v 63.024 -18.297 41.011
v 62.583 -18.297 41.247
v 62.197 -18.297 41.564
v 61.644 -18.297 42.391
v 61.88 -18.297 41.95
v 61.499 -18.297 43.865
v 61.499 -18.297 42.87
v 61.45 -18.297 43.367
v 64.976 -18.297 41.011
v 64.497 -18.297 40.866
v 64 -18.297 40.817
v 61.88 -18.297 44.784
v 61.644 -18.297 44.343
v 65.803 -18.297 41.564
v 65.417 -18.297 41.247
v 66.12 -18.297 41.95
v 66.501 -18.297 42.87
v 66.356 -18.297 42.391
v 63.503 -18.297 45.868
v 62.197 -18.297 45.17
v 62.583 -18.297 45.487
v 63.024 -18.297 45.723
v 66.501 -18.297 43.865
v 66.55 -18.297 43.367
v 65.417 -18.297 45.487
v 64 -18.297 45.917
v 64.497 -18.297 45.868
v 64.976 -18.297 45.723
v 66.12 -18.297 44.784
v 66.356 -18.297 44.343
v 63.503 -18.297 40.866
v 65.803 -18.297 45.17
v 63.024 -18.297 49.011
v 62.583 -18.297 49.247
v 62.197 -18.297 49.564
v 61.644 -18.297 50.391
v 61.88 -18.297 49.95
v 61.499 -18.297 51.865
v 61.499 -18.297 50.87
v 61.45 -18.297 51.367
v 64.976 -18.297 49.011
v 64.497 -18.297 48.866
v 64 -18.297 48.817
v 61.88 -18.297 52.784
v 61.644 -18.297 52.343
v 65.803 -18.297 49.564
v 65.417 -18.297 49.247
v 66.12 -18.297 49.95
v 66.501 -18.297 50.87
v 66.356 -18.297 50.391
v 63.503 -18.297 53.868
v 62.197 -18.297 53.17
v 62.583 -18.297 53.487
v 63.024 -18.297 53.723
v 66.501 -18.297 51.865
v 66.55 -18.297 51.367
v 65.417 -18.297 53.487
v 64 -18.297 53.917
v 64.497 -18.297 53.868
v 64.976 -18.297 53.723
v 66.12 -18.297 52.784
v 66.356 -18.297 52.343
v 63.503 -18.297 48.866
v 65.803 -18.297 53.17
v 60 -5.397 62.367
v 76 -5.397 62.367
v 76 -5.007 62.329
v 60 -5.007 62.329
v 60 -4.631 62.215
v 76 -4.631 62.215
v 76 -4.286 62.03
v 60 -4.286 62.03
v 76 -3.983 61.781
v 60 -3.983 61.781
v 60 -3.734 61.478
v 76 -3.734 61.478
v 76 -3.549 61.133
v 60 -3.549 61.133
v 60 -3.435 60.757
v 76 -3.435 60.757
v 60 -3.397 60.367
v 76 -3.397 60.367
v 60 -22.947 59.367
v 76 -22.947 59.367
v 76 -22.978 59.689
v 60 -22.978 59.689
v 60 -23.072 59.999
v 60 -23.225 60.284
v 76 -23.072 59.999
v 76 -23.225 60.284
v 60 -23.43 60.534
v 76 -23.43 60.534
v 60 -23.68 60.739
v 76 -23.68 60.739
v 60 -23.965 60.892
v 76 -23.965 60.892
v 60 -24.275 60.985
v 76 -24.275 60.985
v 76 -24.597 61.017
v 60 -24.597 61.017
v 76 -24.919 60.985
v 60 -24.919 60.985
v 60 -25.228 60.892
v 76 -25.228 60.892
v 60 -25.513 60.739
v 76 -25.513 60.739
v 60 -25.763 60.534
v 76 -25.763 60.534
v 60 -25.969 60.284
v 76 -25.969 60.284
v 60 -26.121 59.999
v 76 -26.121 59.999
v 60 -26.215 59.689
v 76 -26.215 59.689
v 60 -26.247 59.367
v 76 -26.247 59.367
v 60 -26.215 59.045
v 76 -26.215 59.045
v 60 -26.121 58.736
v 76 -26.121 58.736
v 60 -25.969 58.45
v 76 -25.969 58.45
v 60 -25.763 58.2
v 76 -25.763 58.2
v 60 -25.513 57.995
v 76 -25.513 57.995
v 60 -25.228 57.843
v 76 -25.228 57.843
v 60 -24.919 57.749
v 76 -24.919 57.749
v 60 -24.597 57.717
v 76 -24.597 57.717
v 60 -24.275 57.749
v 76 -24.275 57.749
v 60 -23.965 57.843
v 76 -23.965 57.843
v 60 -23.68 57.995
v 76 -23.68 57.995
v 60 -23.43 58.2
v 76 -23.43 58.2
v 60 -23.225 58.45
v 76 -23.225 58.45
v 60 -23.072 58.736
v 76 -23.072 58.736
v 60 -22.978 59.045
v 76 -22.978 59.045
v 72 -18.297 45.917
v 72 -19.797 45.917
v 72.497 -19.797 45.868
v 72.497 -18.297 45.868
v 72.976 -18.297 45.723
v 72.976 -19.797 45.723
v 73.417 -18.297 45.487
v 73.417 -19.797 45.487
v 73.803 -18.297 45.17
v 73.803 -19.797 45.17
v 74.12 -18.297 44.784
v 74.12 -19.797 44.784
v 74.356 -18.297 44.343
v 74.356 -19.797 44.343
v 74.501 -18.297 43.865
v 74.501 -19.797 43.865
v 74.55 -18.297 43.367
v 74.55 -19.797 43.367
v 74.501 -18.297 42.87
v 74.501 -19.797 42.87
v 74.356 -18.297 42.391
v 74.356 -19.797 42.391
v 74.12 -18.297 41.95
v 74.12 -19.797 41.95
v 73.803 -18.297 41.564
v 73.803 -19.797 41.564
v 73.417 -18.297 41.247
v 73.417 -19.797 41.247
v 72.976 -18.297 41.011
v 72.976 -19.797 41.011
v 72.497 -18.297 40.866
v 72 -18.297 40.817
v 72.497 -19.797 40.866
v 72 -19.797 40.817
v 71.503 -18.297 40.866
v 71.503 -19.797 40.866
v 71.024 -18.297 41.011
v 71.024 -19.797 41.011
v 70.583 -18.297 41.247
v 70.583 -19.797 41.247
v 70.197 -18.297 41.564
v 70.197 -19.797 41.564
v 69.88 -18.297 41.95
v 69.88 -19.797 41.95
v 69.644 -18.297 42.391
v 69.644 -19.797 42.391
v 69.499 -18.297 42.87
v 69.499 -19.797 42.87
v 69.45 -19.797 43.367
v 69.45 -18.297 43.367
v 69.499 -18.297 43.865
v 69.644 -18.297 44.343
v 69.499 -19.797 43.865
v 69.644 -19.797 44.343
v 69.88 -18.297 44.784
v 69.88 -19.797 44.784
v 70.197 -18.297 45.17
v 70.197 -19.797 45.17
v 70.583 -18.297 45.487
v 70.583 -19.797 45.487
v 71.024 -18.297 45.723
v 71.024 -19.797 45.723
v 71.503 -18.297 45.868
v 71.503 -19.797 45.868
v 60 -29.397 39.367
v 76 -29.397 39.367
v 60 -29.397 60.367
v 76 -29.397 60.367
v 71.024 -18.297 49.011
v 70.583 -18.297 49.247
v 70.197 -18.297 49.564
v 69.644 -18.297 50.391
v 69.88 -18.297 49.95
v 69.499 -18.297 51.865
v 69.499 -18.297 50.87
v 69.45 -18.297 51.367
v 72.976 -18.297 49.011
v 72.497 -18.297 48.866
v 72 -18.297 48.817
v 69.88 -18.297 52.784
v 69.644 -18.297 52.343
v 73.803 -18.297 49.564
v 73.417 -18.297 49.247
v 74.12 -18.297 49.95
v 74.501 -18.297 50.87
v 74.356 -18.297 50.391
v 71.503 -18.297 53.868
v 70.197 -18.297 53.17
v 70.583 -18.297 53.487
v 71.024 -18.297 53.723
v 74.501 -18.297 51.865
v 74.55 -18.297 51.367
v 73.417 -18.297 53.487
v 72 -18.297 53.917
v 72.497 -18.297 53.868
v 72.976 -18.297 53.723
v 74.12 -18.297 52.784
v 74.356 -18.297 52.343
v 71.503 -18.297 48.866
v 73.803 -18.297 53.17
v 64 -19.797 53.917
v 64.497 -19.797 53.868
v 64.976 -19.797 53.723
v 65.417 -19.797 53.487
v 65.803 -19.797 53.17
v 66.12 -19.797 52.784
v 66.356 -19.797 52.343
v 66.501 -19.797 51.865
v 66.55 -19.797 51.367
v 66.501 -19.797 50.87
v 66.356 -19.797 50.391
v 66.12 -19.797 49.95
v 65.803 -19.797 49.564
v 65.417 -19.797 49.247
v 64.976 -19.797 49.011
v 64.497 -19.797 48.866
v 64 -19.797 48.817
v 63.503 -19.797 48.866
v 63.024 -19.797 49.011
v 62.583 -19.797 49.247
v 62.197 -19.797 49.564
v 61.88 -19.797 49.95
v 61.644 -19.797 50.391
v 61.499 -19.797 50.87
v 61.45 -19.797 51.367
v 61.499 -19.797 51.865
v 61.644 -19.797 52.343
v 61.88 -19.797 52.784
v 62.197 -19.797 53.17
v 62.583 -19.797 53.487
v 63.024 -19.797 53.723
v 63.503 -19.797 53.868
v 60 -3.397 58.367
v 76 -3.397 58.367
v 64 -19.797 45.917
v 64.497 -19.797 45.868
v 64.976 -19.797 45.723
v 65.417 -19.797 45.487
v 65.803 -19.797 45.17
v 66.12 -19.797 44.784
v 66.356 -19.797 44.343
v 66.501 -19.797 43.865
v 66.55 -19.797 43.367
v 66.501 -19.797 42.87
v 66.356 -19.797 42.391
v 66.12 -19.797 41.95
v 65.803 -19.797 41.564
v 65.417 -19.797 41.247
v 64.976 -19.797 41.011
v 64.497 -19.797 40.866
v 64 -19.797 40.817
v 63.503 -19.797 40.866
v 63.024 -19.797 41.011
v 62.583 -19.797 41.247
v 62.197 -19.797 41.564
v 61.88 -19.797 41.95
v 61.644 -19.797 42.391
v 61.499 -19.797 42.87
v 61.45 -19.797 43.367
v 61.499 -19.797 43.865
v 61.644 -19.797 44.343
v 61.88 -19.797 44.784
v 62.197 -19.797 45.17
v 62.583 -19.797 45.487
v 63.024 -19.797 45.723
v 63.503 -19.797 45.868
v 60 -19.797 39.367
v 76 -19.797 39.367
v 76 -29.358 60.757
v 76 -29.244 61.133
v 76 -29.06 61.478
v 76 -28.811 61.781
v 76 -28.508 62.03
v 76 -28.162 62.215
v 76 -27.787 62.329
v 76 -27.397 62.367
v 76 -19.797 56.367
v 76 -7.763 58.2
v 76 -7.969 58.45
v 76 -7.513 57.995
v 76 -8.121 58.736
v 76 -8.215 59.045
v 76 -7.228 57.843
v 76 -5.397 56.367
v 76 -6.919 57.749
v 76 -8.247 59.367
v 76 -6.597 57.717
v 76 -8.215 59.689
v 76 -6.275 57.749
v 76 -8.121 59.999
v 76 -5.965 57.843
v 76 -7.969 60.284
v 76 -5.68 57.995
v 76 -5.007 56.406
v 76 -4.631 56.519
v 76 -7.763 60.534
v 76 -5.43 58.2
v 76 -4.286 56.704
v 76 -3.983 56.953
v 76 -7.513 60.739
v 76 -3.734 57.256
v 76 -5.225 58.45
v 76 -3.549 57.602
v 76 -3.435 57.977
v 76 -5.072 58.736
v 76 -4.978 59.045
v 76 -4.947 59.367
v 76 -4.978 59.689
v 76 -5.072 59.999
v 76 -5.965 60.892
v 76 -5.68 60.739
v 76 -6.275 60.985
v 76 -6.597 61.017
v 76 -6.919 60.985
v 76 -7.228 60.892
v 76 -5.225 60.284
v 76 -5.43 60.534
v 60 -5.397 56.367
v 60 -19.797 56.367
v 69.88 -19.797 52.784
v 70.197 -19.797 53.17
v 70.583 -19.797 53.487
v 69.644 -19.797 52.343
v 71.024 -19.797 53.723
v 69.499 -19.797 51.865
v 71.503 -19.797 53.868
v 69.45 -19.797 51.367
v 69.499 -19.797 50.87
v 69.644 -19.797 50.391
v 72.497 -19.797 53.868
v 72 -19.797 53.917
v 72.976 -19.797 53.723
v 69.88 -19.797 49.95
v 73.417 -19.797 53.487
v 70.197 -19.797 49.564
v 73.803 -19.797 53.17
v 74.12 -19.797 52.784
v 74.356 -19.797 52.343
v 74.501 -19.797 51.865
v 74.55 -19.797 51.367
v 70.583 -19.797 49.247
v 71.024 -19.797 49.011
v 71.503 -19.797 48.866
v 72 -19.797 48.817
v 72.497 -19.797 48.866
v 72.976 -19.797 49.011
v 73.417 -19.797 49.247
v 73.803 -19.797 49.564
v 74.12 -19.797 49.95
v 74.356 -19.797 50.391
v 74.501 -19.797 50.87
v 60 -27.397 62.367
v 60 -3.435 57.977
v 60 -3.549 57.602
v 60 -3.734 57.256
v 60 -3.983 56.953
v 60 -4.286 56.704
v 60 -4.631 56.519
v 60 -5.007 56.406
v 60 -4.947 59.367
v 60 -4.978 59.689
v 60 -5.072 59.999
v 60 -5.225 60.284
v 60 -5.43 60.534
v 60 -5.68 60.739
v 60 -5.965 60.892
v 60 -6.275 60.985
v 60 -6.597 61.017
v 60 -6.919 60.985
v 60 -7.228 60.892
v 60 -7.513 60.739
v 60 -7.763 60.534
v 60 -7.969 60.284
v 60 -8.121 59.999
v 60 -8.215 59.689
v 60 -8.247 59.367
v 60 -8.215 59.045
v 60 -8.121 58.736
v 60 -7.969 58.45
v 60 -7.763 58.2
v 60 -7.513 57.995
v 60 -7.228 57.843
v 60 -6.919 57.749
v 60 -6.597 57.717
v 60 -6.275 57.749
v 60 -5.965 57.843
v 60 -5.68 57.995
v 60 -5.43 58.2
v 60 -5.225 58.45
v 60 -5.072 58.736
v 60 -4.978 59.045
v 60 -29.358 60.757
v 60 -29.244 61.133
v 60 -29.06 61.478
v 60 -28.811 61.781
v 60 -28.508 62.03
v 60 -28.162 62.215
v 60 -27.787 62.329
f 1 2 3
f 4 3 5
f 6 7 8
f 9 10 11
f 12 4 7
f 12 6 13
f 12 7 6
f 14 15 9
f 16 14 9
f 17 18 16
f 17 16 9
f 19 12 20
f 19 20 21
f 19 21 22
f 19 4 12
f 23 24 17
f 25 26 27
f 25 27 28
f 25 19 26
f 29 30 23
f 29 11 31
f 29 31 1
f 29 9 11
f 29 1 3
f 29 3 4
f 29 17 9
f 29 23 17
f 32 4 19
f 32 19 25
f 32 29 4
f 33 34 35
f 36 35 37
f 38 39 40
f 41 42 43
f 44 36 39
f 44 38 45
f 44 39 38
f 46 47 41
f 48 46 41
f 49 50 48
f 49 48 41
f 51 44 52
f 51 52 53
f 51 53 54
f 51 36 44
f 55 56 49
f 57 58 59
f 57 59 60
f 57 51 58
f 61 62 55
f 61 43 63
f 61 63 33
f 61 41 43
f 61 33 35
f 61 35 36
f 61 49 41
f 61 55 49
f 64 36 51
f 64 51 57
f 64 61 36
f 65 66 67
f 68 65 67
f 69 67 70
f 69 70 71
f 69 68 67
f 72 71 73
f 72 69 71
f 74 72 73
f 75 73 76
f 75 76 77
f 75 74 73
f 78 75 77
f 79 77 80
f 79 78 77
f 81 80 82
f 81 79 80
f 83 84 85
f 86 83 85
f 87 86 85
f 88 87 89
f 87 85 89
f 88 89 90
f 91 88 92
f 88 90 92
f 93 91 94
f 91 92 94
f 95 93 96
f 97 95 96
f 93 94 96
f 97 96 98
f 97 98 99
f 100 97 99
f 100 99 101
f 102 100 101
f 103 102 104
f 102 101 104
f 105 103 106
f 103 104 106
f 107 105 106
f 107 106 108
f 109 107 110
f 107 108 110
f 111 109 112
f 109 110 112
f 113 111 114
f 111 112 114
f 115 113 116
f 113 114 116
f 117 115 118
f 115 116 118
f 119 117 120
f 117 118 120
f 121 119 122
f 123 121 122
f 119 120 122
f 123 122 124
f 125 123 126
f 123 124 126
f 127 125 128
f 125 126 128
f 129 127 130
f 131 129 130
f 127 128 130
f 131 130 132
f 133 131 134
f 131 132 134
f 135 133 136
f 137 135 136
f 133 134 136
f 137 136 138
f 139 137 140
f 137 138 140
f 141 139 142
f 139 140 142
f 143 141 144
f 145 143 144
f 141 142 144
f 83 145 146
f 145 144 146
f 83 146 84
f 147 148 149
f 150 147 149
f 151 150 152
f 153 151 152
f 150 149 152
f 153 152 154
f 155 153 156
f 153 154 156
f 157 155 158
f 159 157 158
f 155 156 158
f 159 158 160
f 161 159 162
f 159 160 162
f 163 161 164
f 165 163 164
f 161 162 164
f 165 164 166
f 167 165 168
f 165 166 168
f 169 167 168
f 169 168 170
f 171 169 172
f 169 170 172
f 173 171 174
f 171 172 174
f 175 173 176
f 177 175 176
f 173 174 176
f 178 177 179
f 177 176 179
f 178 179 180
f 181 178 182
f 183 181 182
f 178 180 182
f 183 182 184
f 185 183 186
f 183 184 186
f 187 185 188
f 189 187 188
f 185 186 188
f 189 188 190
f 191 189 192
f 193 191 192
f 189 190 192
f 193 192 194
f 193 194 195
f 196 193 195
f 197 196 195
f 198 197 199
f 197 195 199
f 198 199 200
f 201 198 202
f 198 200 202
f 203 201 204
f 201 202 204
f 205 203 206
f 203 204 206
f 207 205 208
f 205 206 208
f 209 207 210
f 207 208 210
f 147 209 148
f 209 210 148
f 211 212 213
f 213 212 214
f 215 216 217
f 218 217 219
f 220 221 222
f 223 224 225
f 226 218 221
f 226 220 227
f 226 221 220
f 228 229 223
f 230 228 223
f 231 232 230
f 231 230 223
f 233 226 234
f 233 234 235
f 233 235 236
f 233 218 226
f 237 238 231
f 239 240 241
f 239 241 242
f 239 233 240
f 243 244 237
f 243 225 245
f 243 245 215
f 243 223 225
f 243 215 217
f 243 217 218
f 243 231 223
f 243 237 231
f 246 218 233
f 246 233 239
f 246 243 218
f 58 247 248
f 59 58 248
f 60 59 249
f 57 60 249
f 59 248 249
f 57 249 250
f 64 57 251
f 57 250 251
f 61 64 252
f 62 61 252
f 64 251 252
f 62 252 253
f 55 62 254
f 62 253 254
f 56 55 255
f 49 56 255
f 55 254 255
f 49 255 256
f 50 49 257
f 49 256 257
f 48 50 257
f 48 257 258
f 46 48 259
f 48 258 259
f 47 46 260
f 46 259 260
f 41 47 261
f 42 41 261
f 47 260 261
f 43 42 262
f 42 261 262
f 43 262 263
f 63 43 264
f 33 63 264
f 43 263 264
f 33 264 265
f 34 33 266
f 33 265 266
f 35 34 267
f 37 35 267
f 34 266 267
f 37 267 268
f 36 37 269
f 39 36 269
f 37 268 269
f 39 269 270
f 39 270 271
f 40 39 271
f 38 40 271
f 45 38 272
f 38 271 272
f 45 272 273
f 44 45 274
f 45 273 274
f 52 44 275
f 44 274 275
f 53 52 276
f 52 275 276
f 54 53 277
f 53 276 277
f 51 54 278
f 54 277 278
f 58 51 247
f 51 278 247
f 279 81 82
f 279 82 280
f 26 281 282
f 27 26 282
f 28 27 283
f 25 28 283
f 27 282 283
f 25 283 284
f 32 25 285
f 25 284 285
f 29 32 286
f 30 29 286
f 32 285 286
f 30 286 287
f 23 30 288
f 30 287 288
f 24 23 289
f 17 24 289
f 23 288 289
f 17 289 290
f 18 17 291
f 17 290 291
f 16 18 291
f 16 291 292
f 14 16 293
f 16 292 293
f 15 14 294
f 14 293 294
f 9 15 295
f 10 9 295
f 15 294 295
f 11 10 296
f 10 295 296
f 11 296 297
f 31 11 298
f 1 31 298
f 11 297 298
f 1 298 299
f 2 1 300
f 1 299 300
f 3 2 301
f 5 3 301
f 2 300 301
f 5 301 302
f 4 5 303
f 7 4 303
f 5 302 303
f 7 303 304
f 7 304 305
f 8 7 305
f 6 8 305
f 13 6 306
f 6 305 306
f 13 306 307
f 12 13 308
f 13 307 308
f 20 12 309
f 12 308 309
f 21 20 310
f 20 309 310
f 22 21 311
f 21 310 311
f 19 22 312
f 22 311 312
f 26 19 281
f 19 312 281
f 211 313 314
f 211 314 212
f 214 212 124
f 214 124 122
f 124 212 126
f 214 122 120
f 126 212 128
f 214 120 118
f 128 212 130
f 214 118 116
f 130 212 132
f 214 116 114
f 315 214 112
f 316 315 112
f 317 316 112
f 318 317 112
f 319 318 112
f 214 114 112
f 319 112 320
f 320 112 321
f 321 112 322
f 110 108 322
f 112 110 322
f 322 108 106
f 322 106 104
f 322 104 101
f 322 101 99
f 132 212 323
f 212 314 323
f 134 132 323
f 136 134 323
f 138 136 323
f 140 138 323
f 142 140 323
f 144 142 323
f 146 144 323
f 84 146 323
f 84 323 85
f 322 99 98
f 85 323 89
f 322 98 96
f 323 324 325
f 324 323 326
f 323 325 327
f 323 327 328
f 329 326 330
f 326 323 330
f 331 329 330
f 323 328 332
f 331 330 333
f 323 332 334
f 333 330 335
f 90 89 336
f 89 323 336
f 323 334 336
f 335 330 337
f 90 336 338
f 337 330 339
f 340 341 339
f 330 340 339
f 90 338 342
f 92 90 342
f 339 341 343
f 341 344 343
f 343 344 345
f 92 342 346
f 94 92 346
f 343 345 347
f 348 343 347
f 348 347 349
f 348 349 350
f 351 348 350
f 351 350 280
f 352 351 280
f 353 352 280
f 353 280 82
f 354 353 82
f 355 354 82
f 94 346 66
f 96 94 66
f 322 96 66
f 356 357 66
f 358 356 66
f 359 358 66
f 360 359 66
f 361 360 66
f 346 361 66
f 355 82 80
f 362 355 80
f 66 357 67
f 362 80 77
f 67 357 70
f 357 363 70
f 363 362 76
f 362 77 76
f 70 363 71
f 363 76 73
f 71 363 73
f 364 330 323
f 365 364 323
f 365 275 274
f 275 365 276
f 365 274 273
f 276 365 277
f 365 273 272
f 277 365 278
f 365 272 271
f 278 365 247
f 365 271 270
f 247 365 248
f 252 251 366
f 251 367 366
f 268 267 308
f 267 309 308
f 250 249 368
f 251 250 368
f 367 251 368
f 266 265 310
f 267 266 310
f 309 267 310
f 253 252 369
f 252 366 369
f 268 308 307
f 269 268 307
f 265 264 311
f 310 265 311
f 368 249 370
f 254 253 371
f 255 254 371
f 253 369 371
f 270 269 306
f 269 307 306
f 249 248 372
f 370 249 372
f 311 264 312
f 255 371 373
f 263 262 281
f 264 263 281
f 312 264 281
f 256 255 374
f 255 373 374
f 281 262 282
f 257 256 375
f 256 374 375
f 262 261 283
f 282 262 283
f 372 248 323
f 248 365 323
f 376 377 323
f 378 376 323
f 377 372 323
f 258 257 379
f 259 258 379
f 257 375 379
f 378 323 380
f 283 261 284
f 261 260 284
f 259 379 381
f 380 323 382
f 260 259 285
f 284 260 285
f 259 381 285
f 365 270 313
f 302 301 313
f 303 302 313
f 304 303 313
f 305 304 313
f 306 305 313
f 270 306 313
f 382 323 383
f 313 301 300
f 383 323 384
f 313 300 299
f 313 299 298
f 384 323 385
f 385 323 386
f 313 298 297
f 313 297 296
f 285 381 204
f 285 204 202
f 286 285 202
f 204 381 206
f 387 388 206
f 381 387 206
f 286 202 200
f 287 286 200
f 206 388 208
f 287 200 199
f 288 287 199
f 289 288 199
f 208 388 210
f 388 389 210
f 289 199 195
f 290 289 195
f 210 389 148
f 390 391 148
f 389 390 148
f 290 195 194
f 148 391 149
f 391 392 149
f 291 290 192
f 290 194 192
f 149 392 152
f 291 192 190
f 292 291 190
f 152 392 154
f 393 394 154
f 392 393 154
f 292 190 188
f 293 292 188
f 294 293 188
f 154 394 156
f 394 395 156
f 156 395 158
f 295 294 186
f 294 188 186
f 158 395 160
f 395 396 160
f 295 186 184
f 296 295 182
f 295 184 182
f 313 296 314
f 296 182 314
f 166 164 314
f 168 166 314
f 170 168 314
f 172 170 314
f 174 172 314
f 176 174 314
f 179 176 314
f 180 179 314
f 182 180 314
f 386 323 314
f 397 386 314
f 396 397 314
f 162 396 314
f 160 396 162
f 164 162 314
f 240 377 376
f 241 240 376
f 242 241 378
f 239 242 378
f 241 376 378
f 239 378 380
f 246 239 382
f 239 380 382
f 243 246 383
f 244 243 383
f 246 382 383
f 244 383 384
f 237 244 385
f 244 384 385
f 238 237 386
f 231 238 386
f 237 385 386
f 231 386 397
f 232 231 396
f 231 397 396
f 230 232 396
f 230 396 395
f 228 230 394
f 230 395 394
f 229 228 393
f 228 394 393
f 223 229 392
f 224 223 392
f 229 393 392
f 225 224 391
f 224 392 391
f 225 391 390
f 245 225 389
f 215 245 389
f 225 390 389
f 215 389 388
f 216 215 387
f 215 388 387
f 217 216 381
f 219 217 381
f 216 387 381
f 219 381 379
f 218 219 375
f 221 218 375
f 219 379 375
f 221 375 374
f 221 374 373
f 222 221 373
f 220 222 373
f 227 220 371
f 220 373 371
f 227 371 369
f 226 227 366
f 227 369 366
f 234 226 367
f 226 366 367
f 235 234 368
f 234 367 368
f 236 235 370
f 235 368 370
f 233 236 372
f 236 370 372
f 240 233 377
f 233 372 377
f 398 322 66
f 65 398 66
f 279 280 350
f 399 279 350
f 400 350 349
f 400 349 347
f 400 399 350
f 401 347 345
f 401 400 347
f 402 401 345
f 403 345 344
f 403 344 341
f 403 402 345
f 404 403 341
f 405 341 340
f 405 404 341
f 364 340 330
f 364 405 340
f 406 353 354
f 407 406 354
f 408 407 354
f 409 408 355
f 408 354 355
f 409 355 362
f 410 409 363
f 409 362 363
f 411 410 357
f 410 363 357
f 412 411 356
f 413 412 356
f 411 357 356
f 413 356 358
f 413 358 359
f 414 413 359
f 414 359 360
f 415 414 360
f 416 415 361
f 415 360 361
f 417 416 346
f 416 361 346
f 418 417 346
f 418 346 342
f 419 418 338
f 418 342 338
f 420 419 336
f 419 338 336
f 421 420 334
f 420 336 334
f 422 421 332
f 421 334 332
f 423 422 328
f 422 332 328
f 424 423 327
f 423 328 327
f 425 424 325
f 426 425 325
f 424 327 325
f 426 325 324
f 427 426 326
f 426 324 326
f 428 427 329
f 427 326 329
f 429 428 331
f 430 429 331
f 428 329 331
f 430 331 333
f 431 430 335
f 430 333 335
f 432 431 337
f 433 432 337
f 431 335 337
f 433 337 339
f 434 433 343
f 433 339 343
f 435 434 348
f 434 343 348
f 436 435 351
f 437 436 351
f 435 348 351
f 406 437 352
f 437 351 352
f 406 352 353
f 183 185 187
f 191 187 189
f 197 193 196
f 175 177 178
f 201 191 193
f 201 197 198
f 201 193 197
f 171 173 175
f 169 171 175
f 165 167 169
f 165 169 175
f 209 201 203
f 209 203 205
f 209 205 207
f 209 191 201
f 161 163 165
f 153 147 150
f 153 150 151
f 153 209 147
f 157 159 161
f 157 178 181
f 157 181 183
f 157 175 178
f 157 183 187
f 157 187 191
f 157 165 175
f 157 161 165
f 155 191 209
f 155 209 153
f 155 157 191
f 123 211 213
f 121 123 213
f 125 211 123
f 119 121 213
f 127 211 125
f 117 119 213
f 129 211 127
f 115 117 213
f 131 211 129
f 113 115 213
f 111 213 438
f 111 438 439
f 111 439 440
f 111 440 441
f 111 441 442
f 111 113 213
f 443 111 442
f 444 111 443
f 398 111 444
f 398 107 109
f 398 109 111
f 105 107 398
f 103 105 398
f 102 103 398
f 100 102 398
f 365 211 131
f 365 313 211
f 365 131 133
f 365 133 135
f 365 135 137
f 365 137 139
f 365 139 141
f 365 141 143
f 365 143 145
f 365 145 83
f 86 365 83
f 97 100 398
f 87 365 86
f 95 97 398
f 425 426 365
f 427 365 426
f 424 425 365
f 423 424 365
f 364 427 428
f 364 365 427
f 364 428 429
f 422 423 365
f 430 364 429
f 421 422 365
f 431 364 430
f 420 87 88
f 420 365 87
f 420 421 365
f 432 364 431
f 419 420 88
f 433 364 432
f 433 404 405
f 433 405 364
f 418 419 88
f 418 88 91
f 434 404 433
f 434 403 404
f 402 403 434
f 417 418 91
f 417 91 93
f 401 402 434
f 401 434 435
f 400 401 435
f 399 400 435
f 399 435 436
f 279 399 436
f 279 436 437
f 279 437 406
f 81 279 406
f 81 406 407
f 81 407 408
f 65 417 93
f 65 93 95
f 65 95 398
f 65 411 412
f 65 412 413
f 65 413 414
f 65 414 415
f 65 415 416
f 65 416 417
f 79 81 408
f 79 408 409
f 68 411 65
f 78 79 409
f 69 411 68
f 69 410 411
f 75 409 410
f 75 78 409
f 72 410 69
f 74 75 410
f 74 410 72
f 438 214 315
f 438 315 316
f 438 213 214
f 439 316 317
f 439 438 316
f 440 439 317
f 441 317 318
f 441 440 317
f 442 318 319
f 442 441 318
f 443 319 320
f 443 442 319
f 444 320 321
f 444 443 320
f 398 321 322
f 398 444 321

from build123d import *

# Parameters (mm, degrees)
SKETCH1_R           = 1.65
BOSS_EXTRUDE1_DEPTH = 16
SKETCH2_R           = 2.55
BOSS_EXTRUDE2_DEPTH = 1.5
FILLET1_R           = 2


with BuildPart() as part:
    # Sketch1 → Boss-Extrude1 (new body)
    with BuildSketch(Plane(origin=(76, 0, 0), x_dir=(0, 0, -1), z_dir=(1, 0, 0))):
        Polygon((-39.367141304, -29.396728555), (-62.367141304, -29.396728555), (-62.367141304, -3.396728555), (-56.367141304, -3.396728555), (-56.367141304, -19.796728555), (-39.367141304, -19.796728555), align=None)
        with Locations(Location((-59.367141305, -24.59672823, 0), (0, 0, 90))):
            Circle(SKETCH1_R, mode=Mode.SUBTRACT)
        with Locations(Location((-59.367141305, -6.59672823, 0), (0, 0, 90))):
            Circle(SKETCH1_R, mode=Mode.SUBTRACT)
    extrude(amount=-BOSS_EXTRUDE1_DEPTH)

    # Sketch2 → Boss-Extrude2 (add)
    with BuildSketch(Plane(origin=(0, -19.796728555, 0), x_dir=(1, 0, 0), z_dir=(0, 1, 0))):
        with Locations(Location((64, -51.367141304, 0), (0, 0, 270))):
            Circle(SKETCH2_R)
        with Locations(Location((64, -43.367141304, 0), (0, 0, 270))):
            Circle(SKETCH2_R)
        with Locations(Location((72, -43.367141304, 0), (0, 0, 270))):
            Circle(SKETCH2_R)
        with Locations(Location((72, -51.367141304, 0), (0, 0, 270))):
            Circle(SKETCH2_R)
    extrude(amount=BOSS_EXTRUDE2_DEPTH)

    # Fillet1
    fillet1_edges = [part.edges().sort_by_distance(p)[0] for p in [
        (68, -29.396728555, 62.367141304),
        (68, -3.396728555, 62.367141304),
        (68, -3.396728555, 56.367141304),
    ]]
    fillet(fillet1_edges, radius=FILLET1_R)


solid = part.part
